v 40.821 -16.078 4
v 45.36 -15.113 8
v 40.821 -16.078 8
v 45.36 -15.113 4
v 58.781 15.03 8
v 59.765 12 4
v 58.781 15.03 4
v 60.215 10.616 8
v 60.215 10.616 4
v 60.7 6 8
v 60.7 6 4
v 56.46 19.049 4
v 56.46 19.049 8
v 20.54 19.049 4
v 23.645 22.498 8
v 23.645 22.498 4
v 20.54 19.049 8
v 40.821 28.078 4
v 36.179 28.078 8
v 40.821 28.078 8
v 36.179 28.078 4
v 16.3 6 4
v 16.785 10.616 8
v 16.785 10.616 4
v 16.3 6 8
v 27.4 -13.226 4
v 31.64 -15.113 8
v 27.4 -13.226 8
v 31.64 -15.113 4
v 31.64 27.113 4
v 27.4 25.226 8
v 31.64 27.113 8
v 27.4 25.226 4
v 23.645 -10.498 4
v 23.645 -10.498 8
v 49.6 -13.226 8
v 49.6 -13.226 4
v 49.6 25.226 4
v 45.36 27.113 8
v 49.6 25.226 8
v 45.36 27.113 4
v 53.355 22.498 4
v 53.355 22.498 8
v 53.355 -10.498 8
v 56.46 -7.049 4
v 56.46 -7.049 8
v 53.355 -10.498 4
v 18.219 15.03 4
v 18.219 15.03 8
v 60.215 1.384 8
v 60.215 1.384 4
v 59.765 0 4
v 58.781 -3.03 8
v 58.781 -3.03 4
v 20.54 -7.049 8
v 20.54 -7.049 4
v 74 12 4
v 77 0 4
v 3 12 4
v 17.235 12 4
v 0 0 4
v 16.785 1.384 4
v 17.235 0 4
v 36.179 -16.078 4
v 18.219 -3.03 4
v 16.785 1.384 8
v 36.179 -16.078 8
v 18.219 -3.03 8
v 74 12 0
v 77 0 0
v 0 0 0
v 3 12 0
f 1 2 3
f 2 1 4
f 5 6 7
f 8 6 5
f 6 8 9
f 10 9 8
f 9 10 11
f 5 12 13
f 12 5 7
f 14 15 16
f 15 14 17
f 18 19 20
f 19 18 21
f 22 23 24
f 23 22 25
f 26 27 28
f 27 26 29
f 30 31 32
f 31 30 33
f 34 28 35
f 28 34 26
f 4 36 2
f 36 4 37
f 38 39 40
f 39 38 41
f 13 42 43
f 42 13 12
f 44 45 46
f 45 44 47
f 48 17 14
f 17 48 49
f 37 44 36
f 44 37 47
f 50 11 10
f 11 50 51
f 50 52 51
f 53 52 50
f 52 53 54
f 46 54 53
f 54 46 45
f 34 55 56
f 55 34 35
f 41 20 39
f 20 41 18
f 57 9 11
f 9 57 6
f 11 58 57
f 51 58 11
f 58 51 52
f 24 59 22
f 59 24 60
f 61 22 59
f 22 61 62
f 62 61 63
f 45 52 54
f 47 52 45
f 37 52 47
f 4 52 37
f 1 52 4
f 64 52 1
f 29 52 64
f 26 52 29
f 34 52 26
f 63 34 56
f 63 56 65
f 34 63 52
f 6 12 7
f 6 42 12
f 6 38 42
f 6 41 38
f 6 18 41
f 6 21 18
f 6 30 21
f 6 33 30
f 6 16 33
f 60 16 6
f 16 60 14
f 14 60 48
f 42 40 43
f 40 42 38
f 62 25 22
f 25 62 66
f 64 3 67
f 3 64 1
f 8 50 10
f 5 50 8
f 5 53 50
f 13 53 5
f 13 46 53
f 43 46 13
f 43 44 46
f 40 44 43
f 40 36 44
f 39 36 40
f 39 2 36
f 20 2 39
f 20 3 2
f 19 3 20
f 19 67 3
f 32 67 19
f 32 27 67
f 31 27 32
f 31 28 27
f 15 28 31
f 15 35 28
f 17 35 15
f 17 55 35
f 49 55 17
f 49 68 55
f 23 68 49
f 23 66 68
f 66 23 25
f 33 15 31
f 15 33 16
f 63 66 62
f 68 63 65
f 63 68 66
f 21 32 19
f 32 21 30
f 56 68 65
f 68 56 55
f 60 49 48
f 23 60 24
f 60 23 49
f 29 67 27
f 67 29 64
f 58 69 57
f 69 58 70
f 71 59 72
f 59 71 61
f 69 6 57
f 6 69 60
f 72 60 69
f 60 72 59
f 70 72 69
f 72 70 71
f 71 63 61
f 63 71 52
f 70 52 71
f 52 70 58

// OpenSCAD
//difference()
//{
//    color([1,0,0])
    translate([38.5,6,4])
    cylinder(4,22.2,22.2);

//    translate([35.5,3,4])
//    cube([6,6,4]);
//}
linear_extrude(height = 4)
polygon(points=[[0,0],[3,12],[74,12],[77,0]]);
